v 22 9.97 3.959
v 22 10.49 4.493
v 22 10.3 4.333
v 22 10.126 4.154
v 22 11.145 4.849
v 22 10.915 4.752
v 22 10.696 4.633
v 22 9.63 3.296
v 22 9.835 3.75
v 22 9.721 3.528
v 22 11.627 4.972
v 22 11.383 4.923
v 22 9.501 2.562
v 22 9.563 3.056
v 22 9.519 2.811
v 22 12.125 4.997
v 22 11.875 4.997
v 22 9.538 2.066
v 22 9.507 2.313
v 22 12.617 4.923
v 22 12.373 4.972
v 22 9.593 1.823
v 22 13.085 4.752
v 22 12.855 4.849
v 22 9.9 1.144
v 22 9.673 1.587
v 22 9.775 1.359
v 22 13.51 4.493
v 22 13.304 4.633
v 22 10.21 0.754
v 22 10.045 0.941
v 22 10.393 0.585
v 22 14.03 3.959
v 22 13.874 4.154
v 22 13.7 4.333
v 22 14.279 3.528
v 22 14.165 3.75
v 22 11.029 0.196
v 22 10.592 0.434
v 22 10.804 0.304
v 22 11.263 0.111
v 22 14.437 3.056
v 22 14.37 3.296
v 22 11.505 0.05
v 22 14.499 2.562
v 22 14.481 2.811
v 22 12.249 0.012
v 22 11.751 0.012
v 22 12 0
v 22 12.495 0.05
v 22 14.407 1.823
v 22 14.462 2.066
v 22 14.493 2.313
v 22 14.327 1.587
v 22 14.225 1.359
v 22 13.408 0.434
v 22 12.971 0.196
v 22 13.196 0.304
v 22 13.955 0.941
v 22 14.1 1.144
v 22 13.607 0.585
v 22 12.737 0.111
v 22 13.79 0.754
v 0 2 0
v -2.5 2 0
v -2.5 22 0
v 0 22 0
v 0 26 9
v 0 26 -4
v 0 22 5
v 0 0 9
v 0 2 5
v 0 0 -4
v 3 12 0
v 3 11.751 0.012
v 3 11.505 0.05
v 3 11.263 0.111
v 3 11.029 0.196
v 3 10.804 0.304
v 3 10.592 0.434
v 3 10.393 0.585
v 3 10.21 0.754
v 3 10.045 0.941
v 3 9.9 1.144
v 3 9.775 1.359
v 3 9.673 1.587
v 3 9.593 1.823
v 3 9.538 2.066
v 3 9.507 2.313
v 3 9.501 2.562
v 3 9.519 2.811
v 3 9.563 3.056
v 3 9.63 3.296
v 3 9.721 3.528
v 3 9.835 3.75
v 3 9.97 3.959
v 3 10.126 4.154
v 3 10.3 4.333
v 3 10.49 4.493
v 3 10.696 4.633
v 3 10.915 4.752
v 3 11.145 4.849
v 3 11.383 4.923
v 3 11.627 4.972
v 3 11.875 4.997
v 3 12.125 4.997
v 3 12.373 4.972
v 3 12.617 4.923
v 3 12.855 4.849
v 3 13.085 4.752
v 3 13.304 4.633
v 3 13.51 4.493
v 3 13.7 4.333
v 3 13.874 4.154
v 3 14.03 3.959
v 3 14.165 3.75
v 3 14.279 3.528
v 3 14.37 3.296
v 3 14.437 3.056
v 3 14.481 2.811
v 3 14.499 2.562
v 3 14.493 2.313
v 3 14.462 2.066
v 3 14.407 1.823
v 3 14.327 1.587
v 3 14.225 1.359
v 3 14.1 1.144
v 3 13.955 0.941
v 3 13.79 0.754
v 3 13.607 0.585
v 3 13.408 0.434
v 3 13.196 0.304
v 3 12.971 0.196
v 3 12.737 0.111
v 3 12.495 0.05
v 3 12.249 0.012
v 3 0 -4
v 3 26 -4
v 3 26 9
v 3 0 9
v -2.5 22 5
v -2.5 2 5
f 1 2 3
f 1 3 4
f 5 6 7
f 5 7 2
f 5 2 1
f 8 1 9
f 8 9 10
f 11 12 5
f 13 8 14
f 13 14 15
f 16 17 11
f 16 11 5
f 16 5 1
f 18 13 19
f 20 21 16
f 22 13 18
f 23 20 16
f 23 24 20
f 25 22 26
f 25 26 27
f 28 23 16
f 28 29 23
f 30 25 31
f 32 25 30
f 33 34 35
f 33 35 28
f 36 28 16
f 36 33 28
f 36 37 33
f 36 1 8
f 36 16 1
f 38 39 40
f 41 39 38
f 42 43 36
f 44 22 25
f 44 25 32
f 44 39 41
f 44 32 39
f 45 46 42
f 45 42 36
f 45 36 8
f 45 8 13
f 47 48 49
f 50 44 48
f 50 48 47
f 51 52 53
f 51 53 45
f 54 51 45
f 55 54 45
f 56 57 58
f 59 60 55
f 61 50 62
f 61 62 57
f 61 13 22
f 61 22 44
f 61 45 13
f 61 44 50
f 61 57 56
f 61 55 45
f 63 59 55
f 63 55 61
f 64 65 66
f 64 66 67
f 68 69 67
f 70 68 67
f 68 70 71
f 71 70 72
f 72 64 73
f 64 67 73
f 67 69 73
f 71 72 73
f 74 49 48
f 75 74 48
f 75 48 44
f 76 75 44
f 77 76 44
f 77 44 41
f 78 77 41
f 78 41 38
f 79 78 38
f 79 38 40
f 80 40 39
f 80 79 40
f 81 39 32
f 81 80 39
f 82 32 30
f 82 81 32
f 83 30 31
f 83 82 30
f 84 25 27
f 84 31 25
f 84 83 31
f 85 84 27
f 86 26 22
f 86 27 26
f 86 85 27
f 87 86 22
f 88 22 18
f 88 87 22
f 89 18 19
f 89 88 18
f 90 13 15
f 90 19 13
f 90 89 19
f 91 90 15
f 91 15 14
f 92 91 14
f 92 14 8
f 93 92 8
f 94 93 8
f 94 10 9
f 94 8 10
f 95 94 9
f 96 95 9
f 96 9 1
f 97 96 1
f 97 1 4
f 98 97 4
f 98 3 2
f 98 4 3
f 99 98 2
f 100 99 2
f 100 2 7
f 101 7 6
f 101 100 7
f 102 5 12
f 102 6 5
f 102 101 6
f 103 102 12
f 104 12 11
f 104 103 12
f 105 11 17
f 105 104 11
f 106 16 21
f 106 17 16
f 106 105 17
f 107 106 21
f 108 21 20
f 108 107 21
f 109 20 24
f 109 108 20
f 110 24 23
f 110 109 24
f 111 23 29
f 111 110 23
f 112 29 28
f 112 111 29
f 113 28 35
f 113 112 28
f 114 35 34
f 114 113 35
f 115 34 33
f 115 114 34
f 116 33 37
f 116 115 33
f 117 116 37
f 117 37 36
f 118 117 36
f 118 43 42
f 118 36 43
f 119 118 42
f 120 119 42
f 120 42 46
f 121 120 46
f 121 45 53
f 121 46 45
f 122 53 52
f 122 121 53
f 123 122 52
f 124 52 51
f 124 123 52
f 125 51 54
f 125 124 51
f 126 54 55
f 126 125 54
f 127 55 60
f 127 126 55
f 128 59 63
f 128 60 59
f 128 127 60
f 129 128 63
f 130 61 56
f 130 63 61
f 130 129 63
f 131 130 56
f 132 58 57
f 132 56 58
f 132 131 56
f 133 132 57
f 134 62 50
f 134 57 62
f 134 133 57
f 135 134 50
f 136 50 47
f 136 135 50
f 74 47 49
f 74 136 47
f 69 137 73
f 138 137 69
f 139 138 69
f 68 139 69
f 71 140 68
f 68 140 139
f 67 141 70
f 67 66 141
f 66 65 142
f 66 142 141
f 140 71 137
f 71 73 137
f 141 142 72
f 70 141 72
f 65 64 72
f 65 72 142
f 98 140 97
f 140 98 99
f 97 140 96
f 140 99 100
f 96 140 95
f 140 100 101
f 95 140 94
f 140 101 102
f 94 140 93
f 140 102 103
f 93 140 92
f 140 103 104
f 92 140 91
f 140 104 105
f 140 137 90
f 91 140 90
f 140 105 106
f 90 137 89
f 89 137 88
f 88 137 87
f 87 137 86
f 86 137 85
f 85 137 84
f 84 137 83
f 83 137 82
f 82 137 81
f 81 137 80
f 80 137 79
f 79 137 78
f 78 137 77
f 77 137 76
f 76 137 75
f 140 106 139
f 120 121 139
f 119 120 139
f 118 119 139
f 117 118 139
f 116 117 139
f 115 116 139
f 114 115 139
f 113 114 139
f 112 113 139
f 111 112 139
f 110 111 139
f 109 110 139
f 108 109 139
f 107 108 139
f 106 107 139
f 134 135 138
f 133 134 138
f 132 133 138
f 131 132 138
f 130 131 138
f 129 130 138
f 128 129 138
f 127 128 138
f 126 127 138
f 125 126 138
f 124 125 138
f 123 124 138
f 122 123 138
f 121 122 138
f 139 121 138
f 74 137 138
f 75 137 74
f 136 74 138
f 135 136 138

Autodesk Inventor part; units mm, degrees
ref_plane "YZ Plane" through (0, 0, 0) normal (1, 0, 0) x (0, 1, 0)
ref_plane "XZ Plane" through (0, 0, 0) normal (0, 1, 0) x (-1, 0, 0)
ref_plane "XY Plane" through (0, 0, 0) normal (0, 0, 1) x (1, 0, 0)
sketch "Sketch1" plane through (0, 0, 0) normal (0, 0, 1) x (1, 0, 0)
  line L0 (0, 0) -> (3, 0)
  line L1 (3, 0) -> (3, 26)
  line L2 (3, 26) -> (0, 26)
  line L3 (0, 26) -> (0, 0)
  line L4 (-2.5, 22) -> (0, 22)
  line L5 (0, 22) -> (0, 2)
  line L6 (0, 2) -> (-2.5, 2)
  line L7 (-2.5, 2) -> (-2.5, 22)
  point P0 (-1.25, 2)
  point P1 (0, 22)
  dimension "d0" = 2.5
  dimension "d1" = 20
  dimension "d2" = 26
  dimension "d3" = 3
  dimension "d4" = 2
extrude "Extrusion1" add sketch "Sketch1" along normal blind 5
sketch "Sketch2" plane through (3, 0, 0) normal (1, 0, 0) x (0, 0, -1)
  circle A0 centre (-2.5, 12) radius 2.5
  line L0 (0, 0) -> (0, 26) projected
  line L1 (0, 26) -> (-5, 26) projected
  point P0 (-2.5, 26)
  dimension "d7" = 14
extrude "Extrusion2" add sketch "Sketch2" along normal blind 19
sketch "Sketch3" plane through (3, 26, 5) normal (1, 0, 0) x (0, 0, -1)
  line L0 (5, -26) -> (9, -26)
  line L1 (9, -26) -> (9, 0)
  line L2 (9, 0) -> (5, 0)
  line L3 (5, 0) -> (5, -26)
  line L4 (0, -26) -> (-4, -26)
  line L5 (-4, -26) -> (-4, 0)
  line L6 (-4, 0) -> (0, 0)
  line L7 (0, 0) -> (0, -26)
  dimension "d10" = 4
  dimension "d11" = 4
extrude "Extrusion3" add sketch "Sketch3" against normal blind 3
properties part number "contact_axis"
